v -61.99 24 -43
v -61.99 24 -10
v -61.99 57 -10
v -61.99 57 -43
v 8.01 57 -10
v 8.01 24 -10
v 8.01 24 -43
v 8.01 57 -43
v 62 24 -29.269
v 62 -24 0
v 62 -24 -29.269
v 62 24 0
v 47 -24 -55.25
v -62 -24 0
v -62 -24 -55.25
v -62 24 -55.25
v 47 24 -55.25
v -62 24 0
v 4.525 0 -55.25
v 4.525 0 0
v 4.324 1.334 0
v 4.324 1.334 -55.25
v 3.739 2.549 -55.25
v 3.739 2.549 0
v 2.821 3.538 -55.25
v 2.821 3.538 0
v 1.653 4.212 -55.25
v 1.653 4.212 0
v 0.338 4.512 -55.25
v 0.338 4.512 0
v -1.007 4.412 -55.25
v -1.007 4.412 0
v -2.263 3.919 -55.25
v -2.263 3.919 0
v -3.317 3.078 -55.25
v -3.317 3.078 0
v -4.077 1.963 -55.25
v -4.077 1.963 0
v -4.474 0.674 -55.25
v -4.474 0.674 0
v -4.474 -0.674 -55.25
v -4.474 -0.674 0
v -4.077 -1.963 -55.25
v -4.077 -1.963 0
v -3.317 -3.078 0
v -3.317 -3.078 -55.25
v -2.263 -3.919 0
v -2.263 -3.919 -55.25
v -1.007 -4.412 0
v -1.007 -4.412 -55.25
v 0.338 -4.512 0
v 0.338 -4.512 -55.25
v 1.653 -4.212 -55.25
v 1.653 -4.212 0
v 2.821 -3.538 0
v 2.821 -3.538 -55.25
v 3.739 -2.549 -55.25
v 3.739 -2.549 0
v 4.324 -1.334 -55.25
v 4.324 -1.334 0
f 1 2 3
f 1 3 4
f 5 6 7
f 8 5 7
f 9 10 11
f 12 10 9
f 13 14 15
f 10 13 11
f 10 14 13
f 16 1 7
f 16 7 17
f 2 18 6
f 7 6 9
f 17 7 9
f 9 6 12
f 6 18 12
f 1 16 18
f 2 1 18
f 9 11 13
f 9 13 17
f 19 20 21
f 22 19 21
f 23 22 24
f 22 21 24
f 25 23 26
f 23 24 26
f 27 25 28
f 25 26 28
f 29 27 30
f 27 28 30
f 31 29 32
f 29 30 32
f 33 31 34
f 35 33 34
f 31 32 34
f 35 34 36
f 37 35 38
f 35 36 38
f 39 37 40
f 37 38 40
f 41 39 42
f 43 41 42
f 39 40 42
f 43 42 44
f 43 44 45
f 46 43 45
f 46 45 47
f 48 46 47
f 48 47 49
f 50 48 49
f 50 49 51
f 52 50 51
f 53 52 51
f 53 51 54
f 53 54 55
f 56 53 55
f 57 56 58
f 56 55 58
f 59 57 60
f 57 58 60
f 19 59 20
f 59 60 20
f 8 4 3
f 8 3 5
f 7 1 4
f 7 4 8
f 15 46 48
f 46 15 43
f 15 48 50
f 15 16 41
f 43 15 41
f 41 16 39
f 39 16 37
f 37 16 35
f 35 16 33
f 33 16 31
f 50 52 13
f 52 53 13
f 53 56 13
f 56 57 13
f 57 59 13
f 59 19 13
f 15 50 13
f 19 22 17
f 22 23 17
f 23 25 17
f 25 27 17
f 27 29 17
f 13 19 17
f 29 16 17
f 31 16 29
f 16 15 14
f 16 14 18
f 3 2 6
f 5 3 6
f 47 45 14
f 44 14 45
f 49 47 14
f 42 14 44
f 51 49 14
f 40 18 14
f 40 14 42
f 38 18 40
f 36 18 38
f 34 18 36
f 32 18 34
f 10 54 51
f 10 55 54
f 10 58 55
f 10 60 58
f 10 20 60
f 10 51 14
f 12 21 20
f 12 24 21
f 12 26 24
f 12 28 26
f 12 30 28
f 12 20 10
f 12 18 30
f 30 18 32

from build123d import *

# Parameters (mm, degrees)
SKETCH1_W           = 124
SKETCH1_H           = 48
SKETCH1_R           = 4.525
BOSS_EXTRUDE1_DEPTH = 55.25
SKETCH2_W           = 70
SKETCH2_H           = 33
BOSS_EXTRUDE2_DEPTH = 33
CHAMFER1_SIZE       = 15
CHAMFER1_SIZE2      = 25.980762114


with BuildPart() as part:
    # Sketch1 → Boss-Extrude1 (new body)
    with BuildSketch(Plane.XY):
        Rectangle(SKETCH1_W, SKETCH1_H)
        Circle(SKETCH1_R, mode=Mode.SUBTRACT)
    extrude(amount=-BOSS_EXTRUDE1_DEPTH)

    # Sketch2 → Boss-Extrude2 (add)
    with BuildSketch(Plane(origin=(0, 24, 0), x_dir=(1, 0, 0), z_dir=(0, 1, 0))):
        with Locations((-26.99, 26.5)):
            Rectangle(SKETCH2_W, SKETCH2_H)
    extrude(amount=BOSS_EXTRUDE2_DEPTH)

    # Chamfer1
    chamfer1_edges = [part.edges().sort_by_distance(p)[0] for p in [
        (62, 0, -55.25),
    ]]
    chamfer1_side = [part.faces().sort_by_distance(p)[0] for p in [
        (0, 22.670338389, -55.25),
    ]]
    chamfer(chamfer1_edges, length=CHAMFER1_SIZE, length2=CHAMFER1_SIZE2, reference=chamfer1_side[0])


solid = part.part
